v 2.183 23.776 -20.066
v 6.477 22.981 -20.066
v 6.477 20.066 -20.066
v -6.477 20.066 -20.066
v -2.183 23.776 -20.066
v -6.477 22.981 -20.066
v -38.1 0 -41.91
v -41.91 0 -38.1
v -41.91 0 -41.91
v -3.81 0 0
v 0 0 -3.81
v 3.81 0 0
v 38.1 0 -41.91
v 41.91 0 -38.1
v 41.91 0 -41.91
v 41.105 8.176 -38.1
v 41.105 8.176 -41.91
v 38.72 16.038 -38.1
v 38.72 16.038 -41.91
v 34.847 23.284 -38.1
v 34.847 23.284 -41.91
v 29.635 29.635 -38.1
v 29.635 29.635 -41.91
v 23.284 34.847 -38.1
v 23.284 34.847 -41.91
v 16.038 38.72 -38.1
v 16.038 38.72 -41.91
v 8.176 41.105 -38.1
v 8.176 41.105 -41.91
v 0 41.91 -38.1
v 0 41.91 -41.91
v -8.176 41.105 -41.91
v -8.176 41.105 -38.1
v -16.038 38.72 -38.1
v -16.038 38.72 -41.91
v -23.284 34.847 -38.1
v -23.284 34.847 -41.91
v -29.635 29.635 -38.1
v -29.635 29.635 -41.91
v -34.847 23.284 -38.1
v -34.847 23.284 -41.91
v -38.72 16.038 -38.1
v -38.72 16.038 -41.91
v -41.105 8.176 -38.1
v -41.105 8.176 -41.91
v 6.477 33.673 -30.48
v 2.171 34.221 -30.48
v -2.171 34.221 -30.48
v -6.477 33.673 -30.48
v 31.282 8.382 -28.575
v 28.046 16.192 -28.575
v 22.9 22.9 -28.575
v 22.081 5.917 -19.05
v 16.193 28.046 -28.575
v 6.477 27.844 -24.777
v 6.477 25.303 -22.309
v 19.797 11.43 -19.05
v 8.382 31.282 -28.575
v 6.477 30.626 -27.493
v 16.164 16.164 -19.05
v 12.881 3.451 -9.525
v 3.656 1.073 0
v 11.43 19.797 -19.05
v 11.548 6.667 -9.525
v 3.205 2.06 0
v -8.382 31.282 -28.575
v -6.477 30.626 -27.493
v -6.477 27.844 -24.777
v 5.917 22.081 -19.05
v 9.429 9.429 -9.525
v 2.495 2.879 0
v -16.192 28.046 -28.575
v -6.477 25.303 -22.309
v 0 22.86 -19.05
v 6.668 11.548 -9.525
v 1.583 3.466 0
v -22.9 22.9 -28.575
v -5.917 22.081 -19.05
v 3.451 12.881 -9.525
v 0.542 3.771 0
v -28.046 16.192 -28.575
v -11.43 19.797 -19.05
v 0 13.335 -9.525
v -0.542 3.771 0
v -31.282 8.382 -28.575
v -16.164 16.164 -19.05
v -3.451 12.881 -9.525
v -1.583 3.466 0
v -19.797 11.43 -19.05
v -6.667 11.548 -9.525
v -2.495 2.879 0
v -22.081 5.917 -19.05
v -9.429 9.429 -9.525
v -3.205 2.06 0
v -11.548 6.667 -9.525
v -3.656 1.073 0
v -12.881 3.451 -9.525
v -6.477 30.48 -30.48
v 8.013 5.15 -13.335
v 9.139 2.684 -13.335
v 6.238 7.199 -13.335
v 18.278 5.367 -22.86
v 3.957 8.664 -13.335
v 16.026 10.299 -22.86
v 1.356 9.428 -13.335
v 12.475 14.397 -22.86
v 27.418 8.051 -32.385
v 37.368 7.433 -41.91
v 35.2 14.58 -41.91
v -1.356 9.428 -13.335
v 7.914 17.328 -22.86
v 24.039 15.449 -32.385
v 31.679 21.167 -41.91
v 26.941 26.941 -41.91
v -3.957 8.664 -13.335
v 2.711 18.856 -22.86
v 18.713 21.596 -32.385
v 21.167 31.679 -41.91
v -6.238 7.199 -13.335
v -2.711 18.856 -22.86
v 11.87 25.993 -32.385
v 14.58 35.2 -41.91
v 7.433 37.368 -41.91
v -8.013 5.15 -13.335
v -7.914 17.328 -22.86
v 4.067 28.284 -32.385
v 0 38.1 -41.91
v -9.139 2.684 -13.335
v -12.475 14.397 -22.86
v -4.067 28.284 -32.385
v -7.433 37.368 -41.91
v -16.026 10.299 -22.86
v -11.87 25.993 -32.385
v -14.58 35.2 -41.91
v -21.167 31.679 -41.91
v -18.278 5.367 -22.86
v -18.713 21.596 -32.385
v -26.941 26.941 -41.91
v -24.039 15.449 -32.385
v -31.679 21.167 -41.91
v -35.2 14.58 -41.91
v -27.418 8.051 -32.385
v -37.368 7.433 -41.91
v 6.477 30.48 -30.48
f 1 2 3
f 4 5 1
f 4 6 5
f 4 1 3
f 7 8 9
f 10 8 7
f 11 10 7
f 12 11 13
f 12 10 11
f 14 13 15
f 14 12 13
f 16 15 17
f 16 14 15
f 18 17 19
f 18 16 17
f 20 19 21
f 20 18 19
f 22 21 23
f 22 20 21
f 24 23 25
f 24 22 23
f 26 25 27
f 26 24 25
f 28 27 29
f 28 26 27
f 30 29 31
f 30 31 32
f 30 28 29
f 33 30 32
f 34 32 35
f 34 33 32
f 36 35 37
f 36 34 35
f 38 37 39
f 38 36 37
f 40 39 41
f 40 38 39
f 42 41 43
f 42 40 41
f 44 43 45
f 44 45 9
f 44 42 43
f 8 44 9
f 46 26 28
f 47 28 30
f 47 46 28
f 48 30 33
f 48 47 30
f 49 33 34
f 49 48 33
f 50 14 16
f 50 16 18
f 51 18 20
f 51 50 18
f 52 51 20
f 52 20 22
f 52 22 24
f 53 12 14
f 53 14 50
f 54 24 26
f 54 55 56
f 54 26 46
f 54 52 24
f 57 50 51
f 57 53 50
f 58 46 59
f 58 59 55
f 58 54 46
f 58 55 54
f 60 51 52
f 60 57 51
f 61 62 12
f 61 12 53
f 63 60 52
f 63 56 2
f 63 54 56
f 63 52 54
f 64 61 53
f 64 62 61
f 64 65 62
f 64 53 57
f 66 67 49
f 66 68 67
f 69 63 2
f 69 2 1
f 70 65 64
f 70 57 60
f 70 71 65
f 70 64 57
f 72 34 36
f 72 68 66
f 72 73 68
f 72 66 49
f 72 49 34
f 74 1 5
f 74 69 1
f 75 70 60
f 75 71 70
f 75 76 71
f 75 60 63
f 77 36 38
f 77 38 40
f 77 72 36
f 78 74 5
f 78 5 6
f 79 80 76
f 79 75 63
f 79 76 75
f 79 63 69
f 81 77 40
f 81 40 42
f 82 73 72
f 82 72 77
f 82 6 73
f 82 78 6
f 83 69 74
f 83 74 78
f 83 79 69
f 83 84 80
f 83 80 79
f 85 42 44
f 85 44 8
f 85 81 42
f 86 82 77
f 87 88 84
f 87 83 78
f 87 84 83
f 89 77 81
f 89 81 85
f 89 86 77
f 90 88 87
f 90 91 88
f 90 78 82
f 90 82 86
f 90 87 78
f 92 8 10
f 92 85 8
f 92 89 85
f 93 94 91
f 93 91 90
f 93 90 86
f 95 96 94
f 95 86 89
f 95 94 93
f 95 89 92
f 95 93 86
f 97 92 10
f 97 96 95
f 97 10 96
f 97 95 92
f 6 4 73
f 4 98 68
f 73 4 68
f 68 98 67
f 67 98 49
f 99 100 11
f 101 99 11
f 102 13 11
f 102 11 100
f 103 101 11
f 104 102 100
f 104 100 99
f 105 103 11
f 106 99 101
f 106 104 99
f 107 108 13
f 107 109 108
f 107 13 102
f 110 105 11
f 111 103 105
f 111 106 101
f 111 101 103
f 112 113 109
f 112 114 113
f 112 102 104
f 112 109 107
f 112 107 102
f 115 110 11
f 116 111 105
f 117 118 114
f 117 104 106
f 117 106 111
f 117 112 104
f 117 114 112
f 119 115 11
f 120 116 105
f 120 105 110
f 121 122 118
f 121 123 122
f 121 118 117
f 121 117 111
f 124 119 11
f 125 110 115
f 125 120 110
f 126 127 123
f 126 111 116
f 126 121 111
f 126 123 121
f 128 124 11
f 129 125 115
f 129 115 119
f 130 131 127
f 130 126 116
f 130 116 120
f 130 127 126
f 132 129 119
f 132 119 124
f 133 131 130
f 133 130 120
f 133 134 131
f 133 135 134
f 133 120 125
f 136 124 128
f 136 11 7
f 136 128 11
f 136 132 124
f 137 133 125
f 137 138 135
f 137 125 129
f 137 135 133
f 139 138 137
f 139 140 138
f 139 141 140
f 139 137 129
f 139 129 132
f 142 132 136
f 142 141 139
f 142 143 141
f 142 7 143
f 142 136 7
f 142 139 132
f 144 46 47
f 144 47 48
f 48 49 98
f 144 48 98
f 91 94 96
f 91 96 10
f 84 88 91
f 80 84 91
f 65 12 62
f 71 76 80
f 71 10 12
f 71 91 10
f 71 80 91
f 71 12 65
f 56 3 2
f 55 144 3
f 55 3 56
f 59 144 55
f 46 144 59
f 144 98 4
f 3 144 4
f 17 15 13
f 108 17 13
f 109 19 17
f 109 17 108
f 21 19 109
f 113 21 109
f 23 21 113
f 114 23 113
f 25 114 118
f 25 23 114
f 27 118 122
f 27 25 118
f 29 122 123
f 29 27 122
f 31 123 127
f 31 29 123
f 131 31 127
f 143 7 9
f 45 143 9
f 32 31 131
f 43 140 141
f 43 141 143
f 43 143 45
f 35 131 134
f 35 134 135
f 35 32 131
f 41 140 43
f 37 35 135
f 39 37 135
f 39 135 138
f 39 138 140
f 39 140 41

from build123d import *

# Parameters (mm, degrees)
REVOLVE2_ANGLE          = 180
CUT_EXTRUDE1_DEPTH      = 6.477
CUT_EXTRUDE1_DEPTH_BACK = 6.477


# Read off the part's stored shape, not the designer's step: Revolve2
with BuildPart() as part:
    # Revolve2 outline → Revolve2 (revolve)
    with BuildSketch(Plane.XZ):
        Polygon((3.81, 0), (0, 0), (0, -3.81), (38.1, -41.91), (41.91, -41.91), (41.91, -38.1), align=None)
    revolve(axis=Axis((0, 0, 0), (0, 0, 1)), revolution_arc=REVOLVE2_ANGLE)

    # Sketch6 → Cut-Extrude1 (cut, two sides: drawn at the far end of the back side and taken through both)
    with BuildSketch(Plane(origin=(0, 0, 0), x_dir=(0, 0, -1), z_dir=(1, 0, 0)).offset(-CUT_EXTRUDE1_DEPTH_BACK)):
        Polygon((20.066, 20.066), (20.066, 29.318948776), (20.066, 36.223650293), (30.48, 36.223650293), (30.48, 30.48), align=None)
    extrude(amount=CUT_EXTRUDE1_DEPTH + CUT_EXTRUDE1_DEPTH_BACK, mode=Mode.SUBTRACT)


solid = part.part
